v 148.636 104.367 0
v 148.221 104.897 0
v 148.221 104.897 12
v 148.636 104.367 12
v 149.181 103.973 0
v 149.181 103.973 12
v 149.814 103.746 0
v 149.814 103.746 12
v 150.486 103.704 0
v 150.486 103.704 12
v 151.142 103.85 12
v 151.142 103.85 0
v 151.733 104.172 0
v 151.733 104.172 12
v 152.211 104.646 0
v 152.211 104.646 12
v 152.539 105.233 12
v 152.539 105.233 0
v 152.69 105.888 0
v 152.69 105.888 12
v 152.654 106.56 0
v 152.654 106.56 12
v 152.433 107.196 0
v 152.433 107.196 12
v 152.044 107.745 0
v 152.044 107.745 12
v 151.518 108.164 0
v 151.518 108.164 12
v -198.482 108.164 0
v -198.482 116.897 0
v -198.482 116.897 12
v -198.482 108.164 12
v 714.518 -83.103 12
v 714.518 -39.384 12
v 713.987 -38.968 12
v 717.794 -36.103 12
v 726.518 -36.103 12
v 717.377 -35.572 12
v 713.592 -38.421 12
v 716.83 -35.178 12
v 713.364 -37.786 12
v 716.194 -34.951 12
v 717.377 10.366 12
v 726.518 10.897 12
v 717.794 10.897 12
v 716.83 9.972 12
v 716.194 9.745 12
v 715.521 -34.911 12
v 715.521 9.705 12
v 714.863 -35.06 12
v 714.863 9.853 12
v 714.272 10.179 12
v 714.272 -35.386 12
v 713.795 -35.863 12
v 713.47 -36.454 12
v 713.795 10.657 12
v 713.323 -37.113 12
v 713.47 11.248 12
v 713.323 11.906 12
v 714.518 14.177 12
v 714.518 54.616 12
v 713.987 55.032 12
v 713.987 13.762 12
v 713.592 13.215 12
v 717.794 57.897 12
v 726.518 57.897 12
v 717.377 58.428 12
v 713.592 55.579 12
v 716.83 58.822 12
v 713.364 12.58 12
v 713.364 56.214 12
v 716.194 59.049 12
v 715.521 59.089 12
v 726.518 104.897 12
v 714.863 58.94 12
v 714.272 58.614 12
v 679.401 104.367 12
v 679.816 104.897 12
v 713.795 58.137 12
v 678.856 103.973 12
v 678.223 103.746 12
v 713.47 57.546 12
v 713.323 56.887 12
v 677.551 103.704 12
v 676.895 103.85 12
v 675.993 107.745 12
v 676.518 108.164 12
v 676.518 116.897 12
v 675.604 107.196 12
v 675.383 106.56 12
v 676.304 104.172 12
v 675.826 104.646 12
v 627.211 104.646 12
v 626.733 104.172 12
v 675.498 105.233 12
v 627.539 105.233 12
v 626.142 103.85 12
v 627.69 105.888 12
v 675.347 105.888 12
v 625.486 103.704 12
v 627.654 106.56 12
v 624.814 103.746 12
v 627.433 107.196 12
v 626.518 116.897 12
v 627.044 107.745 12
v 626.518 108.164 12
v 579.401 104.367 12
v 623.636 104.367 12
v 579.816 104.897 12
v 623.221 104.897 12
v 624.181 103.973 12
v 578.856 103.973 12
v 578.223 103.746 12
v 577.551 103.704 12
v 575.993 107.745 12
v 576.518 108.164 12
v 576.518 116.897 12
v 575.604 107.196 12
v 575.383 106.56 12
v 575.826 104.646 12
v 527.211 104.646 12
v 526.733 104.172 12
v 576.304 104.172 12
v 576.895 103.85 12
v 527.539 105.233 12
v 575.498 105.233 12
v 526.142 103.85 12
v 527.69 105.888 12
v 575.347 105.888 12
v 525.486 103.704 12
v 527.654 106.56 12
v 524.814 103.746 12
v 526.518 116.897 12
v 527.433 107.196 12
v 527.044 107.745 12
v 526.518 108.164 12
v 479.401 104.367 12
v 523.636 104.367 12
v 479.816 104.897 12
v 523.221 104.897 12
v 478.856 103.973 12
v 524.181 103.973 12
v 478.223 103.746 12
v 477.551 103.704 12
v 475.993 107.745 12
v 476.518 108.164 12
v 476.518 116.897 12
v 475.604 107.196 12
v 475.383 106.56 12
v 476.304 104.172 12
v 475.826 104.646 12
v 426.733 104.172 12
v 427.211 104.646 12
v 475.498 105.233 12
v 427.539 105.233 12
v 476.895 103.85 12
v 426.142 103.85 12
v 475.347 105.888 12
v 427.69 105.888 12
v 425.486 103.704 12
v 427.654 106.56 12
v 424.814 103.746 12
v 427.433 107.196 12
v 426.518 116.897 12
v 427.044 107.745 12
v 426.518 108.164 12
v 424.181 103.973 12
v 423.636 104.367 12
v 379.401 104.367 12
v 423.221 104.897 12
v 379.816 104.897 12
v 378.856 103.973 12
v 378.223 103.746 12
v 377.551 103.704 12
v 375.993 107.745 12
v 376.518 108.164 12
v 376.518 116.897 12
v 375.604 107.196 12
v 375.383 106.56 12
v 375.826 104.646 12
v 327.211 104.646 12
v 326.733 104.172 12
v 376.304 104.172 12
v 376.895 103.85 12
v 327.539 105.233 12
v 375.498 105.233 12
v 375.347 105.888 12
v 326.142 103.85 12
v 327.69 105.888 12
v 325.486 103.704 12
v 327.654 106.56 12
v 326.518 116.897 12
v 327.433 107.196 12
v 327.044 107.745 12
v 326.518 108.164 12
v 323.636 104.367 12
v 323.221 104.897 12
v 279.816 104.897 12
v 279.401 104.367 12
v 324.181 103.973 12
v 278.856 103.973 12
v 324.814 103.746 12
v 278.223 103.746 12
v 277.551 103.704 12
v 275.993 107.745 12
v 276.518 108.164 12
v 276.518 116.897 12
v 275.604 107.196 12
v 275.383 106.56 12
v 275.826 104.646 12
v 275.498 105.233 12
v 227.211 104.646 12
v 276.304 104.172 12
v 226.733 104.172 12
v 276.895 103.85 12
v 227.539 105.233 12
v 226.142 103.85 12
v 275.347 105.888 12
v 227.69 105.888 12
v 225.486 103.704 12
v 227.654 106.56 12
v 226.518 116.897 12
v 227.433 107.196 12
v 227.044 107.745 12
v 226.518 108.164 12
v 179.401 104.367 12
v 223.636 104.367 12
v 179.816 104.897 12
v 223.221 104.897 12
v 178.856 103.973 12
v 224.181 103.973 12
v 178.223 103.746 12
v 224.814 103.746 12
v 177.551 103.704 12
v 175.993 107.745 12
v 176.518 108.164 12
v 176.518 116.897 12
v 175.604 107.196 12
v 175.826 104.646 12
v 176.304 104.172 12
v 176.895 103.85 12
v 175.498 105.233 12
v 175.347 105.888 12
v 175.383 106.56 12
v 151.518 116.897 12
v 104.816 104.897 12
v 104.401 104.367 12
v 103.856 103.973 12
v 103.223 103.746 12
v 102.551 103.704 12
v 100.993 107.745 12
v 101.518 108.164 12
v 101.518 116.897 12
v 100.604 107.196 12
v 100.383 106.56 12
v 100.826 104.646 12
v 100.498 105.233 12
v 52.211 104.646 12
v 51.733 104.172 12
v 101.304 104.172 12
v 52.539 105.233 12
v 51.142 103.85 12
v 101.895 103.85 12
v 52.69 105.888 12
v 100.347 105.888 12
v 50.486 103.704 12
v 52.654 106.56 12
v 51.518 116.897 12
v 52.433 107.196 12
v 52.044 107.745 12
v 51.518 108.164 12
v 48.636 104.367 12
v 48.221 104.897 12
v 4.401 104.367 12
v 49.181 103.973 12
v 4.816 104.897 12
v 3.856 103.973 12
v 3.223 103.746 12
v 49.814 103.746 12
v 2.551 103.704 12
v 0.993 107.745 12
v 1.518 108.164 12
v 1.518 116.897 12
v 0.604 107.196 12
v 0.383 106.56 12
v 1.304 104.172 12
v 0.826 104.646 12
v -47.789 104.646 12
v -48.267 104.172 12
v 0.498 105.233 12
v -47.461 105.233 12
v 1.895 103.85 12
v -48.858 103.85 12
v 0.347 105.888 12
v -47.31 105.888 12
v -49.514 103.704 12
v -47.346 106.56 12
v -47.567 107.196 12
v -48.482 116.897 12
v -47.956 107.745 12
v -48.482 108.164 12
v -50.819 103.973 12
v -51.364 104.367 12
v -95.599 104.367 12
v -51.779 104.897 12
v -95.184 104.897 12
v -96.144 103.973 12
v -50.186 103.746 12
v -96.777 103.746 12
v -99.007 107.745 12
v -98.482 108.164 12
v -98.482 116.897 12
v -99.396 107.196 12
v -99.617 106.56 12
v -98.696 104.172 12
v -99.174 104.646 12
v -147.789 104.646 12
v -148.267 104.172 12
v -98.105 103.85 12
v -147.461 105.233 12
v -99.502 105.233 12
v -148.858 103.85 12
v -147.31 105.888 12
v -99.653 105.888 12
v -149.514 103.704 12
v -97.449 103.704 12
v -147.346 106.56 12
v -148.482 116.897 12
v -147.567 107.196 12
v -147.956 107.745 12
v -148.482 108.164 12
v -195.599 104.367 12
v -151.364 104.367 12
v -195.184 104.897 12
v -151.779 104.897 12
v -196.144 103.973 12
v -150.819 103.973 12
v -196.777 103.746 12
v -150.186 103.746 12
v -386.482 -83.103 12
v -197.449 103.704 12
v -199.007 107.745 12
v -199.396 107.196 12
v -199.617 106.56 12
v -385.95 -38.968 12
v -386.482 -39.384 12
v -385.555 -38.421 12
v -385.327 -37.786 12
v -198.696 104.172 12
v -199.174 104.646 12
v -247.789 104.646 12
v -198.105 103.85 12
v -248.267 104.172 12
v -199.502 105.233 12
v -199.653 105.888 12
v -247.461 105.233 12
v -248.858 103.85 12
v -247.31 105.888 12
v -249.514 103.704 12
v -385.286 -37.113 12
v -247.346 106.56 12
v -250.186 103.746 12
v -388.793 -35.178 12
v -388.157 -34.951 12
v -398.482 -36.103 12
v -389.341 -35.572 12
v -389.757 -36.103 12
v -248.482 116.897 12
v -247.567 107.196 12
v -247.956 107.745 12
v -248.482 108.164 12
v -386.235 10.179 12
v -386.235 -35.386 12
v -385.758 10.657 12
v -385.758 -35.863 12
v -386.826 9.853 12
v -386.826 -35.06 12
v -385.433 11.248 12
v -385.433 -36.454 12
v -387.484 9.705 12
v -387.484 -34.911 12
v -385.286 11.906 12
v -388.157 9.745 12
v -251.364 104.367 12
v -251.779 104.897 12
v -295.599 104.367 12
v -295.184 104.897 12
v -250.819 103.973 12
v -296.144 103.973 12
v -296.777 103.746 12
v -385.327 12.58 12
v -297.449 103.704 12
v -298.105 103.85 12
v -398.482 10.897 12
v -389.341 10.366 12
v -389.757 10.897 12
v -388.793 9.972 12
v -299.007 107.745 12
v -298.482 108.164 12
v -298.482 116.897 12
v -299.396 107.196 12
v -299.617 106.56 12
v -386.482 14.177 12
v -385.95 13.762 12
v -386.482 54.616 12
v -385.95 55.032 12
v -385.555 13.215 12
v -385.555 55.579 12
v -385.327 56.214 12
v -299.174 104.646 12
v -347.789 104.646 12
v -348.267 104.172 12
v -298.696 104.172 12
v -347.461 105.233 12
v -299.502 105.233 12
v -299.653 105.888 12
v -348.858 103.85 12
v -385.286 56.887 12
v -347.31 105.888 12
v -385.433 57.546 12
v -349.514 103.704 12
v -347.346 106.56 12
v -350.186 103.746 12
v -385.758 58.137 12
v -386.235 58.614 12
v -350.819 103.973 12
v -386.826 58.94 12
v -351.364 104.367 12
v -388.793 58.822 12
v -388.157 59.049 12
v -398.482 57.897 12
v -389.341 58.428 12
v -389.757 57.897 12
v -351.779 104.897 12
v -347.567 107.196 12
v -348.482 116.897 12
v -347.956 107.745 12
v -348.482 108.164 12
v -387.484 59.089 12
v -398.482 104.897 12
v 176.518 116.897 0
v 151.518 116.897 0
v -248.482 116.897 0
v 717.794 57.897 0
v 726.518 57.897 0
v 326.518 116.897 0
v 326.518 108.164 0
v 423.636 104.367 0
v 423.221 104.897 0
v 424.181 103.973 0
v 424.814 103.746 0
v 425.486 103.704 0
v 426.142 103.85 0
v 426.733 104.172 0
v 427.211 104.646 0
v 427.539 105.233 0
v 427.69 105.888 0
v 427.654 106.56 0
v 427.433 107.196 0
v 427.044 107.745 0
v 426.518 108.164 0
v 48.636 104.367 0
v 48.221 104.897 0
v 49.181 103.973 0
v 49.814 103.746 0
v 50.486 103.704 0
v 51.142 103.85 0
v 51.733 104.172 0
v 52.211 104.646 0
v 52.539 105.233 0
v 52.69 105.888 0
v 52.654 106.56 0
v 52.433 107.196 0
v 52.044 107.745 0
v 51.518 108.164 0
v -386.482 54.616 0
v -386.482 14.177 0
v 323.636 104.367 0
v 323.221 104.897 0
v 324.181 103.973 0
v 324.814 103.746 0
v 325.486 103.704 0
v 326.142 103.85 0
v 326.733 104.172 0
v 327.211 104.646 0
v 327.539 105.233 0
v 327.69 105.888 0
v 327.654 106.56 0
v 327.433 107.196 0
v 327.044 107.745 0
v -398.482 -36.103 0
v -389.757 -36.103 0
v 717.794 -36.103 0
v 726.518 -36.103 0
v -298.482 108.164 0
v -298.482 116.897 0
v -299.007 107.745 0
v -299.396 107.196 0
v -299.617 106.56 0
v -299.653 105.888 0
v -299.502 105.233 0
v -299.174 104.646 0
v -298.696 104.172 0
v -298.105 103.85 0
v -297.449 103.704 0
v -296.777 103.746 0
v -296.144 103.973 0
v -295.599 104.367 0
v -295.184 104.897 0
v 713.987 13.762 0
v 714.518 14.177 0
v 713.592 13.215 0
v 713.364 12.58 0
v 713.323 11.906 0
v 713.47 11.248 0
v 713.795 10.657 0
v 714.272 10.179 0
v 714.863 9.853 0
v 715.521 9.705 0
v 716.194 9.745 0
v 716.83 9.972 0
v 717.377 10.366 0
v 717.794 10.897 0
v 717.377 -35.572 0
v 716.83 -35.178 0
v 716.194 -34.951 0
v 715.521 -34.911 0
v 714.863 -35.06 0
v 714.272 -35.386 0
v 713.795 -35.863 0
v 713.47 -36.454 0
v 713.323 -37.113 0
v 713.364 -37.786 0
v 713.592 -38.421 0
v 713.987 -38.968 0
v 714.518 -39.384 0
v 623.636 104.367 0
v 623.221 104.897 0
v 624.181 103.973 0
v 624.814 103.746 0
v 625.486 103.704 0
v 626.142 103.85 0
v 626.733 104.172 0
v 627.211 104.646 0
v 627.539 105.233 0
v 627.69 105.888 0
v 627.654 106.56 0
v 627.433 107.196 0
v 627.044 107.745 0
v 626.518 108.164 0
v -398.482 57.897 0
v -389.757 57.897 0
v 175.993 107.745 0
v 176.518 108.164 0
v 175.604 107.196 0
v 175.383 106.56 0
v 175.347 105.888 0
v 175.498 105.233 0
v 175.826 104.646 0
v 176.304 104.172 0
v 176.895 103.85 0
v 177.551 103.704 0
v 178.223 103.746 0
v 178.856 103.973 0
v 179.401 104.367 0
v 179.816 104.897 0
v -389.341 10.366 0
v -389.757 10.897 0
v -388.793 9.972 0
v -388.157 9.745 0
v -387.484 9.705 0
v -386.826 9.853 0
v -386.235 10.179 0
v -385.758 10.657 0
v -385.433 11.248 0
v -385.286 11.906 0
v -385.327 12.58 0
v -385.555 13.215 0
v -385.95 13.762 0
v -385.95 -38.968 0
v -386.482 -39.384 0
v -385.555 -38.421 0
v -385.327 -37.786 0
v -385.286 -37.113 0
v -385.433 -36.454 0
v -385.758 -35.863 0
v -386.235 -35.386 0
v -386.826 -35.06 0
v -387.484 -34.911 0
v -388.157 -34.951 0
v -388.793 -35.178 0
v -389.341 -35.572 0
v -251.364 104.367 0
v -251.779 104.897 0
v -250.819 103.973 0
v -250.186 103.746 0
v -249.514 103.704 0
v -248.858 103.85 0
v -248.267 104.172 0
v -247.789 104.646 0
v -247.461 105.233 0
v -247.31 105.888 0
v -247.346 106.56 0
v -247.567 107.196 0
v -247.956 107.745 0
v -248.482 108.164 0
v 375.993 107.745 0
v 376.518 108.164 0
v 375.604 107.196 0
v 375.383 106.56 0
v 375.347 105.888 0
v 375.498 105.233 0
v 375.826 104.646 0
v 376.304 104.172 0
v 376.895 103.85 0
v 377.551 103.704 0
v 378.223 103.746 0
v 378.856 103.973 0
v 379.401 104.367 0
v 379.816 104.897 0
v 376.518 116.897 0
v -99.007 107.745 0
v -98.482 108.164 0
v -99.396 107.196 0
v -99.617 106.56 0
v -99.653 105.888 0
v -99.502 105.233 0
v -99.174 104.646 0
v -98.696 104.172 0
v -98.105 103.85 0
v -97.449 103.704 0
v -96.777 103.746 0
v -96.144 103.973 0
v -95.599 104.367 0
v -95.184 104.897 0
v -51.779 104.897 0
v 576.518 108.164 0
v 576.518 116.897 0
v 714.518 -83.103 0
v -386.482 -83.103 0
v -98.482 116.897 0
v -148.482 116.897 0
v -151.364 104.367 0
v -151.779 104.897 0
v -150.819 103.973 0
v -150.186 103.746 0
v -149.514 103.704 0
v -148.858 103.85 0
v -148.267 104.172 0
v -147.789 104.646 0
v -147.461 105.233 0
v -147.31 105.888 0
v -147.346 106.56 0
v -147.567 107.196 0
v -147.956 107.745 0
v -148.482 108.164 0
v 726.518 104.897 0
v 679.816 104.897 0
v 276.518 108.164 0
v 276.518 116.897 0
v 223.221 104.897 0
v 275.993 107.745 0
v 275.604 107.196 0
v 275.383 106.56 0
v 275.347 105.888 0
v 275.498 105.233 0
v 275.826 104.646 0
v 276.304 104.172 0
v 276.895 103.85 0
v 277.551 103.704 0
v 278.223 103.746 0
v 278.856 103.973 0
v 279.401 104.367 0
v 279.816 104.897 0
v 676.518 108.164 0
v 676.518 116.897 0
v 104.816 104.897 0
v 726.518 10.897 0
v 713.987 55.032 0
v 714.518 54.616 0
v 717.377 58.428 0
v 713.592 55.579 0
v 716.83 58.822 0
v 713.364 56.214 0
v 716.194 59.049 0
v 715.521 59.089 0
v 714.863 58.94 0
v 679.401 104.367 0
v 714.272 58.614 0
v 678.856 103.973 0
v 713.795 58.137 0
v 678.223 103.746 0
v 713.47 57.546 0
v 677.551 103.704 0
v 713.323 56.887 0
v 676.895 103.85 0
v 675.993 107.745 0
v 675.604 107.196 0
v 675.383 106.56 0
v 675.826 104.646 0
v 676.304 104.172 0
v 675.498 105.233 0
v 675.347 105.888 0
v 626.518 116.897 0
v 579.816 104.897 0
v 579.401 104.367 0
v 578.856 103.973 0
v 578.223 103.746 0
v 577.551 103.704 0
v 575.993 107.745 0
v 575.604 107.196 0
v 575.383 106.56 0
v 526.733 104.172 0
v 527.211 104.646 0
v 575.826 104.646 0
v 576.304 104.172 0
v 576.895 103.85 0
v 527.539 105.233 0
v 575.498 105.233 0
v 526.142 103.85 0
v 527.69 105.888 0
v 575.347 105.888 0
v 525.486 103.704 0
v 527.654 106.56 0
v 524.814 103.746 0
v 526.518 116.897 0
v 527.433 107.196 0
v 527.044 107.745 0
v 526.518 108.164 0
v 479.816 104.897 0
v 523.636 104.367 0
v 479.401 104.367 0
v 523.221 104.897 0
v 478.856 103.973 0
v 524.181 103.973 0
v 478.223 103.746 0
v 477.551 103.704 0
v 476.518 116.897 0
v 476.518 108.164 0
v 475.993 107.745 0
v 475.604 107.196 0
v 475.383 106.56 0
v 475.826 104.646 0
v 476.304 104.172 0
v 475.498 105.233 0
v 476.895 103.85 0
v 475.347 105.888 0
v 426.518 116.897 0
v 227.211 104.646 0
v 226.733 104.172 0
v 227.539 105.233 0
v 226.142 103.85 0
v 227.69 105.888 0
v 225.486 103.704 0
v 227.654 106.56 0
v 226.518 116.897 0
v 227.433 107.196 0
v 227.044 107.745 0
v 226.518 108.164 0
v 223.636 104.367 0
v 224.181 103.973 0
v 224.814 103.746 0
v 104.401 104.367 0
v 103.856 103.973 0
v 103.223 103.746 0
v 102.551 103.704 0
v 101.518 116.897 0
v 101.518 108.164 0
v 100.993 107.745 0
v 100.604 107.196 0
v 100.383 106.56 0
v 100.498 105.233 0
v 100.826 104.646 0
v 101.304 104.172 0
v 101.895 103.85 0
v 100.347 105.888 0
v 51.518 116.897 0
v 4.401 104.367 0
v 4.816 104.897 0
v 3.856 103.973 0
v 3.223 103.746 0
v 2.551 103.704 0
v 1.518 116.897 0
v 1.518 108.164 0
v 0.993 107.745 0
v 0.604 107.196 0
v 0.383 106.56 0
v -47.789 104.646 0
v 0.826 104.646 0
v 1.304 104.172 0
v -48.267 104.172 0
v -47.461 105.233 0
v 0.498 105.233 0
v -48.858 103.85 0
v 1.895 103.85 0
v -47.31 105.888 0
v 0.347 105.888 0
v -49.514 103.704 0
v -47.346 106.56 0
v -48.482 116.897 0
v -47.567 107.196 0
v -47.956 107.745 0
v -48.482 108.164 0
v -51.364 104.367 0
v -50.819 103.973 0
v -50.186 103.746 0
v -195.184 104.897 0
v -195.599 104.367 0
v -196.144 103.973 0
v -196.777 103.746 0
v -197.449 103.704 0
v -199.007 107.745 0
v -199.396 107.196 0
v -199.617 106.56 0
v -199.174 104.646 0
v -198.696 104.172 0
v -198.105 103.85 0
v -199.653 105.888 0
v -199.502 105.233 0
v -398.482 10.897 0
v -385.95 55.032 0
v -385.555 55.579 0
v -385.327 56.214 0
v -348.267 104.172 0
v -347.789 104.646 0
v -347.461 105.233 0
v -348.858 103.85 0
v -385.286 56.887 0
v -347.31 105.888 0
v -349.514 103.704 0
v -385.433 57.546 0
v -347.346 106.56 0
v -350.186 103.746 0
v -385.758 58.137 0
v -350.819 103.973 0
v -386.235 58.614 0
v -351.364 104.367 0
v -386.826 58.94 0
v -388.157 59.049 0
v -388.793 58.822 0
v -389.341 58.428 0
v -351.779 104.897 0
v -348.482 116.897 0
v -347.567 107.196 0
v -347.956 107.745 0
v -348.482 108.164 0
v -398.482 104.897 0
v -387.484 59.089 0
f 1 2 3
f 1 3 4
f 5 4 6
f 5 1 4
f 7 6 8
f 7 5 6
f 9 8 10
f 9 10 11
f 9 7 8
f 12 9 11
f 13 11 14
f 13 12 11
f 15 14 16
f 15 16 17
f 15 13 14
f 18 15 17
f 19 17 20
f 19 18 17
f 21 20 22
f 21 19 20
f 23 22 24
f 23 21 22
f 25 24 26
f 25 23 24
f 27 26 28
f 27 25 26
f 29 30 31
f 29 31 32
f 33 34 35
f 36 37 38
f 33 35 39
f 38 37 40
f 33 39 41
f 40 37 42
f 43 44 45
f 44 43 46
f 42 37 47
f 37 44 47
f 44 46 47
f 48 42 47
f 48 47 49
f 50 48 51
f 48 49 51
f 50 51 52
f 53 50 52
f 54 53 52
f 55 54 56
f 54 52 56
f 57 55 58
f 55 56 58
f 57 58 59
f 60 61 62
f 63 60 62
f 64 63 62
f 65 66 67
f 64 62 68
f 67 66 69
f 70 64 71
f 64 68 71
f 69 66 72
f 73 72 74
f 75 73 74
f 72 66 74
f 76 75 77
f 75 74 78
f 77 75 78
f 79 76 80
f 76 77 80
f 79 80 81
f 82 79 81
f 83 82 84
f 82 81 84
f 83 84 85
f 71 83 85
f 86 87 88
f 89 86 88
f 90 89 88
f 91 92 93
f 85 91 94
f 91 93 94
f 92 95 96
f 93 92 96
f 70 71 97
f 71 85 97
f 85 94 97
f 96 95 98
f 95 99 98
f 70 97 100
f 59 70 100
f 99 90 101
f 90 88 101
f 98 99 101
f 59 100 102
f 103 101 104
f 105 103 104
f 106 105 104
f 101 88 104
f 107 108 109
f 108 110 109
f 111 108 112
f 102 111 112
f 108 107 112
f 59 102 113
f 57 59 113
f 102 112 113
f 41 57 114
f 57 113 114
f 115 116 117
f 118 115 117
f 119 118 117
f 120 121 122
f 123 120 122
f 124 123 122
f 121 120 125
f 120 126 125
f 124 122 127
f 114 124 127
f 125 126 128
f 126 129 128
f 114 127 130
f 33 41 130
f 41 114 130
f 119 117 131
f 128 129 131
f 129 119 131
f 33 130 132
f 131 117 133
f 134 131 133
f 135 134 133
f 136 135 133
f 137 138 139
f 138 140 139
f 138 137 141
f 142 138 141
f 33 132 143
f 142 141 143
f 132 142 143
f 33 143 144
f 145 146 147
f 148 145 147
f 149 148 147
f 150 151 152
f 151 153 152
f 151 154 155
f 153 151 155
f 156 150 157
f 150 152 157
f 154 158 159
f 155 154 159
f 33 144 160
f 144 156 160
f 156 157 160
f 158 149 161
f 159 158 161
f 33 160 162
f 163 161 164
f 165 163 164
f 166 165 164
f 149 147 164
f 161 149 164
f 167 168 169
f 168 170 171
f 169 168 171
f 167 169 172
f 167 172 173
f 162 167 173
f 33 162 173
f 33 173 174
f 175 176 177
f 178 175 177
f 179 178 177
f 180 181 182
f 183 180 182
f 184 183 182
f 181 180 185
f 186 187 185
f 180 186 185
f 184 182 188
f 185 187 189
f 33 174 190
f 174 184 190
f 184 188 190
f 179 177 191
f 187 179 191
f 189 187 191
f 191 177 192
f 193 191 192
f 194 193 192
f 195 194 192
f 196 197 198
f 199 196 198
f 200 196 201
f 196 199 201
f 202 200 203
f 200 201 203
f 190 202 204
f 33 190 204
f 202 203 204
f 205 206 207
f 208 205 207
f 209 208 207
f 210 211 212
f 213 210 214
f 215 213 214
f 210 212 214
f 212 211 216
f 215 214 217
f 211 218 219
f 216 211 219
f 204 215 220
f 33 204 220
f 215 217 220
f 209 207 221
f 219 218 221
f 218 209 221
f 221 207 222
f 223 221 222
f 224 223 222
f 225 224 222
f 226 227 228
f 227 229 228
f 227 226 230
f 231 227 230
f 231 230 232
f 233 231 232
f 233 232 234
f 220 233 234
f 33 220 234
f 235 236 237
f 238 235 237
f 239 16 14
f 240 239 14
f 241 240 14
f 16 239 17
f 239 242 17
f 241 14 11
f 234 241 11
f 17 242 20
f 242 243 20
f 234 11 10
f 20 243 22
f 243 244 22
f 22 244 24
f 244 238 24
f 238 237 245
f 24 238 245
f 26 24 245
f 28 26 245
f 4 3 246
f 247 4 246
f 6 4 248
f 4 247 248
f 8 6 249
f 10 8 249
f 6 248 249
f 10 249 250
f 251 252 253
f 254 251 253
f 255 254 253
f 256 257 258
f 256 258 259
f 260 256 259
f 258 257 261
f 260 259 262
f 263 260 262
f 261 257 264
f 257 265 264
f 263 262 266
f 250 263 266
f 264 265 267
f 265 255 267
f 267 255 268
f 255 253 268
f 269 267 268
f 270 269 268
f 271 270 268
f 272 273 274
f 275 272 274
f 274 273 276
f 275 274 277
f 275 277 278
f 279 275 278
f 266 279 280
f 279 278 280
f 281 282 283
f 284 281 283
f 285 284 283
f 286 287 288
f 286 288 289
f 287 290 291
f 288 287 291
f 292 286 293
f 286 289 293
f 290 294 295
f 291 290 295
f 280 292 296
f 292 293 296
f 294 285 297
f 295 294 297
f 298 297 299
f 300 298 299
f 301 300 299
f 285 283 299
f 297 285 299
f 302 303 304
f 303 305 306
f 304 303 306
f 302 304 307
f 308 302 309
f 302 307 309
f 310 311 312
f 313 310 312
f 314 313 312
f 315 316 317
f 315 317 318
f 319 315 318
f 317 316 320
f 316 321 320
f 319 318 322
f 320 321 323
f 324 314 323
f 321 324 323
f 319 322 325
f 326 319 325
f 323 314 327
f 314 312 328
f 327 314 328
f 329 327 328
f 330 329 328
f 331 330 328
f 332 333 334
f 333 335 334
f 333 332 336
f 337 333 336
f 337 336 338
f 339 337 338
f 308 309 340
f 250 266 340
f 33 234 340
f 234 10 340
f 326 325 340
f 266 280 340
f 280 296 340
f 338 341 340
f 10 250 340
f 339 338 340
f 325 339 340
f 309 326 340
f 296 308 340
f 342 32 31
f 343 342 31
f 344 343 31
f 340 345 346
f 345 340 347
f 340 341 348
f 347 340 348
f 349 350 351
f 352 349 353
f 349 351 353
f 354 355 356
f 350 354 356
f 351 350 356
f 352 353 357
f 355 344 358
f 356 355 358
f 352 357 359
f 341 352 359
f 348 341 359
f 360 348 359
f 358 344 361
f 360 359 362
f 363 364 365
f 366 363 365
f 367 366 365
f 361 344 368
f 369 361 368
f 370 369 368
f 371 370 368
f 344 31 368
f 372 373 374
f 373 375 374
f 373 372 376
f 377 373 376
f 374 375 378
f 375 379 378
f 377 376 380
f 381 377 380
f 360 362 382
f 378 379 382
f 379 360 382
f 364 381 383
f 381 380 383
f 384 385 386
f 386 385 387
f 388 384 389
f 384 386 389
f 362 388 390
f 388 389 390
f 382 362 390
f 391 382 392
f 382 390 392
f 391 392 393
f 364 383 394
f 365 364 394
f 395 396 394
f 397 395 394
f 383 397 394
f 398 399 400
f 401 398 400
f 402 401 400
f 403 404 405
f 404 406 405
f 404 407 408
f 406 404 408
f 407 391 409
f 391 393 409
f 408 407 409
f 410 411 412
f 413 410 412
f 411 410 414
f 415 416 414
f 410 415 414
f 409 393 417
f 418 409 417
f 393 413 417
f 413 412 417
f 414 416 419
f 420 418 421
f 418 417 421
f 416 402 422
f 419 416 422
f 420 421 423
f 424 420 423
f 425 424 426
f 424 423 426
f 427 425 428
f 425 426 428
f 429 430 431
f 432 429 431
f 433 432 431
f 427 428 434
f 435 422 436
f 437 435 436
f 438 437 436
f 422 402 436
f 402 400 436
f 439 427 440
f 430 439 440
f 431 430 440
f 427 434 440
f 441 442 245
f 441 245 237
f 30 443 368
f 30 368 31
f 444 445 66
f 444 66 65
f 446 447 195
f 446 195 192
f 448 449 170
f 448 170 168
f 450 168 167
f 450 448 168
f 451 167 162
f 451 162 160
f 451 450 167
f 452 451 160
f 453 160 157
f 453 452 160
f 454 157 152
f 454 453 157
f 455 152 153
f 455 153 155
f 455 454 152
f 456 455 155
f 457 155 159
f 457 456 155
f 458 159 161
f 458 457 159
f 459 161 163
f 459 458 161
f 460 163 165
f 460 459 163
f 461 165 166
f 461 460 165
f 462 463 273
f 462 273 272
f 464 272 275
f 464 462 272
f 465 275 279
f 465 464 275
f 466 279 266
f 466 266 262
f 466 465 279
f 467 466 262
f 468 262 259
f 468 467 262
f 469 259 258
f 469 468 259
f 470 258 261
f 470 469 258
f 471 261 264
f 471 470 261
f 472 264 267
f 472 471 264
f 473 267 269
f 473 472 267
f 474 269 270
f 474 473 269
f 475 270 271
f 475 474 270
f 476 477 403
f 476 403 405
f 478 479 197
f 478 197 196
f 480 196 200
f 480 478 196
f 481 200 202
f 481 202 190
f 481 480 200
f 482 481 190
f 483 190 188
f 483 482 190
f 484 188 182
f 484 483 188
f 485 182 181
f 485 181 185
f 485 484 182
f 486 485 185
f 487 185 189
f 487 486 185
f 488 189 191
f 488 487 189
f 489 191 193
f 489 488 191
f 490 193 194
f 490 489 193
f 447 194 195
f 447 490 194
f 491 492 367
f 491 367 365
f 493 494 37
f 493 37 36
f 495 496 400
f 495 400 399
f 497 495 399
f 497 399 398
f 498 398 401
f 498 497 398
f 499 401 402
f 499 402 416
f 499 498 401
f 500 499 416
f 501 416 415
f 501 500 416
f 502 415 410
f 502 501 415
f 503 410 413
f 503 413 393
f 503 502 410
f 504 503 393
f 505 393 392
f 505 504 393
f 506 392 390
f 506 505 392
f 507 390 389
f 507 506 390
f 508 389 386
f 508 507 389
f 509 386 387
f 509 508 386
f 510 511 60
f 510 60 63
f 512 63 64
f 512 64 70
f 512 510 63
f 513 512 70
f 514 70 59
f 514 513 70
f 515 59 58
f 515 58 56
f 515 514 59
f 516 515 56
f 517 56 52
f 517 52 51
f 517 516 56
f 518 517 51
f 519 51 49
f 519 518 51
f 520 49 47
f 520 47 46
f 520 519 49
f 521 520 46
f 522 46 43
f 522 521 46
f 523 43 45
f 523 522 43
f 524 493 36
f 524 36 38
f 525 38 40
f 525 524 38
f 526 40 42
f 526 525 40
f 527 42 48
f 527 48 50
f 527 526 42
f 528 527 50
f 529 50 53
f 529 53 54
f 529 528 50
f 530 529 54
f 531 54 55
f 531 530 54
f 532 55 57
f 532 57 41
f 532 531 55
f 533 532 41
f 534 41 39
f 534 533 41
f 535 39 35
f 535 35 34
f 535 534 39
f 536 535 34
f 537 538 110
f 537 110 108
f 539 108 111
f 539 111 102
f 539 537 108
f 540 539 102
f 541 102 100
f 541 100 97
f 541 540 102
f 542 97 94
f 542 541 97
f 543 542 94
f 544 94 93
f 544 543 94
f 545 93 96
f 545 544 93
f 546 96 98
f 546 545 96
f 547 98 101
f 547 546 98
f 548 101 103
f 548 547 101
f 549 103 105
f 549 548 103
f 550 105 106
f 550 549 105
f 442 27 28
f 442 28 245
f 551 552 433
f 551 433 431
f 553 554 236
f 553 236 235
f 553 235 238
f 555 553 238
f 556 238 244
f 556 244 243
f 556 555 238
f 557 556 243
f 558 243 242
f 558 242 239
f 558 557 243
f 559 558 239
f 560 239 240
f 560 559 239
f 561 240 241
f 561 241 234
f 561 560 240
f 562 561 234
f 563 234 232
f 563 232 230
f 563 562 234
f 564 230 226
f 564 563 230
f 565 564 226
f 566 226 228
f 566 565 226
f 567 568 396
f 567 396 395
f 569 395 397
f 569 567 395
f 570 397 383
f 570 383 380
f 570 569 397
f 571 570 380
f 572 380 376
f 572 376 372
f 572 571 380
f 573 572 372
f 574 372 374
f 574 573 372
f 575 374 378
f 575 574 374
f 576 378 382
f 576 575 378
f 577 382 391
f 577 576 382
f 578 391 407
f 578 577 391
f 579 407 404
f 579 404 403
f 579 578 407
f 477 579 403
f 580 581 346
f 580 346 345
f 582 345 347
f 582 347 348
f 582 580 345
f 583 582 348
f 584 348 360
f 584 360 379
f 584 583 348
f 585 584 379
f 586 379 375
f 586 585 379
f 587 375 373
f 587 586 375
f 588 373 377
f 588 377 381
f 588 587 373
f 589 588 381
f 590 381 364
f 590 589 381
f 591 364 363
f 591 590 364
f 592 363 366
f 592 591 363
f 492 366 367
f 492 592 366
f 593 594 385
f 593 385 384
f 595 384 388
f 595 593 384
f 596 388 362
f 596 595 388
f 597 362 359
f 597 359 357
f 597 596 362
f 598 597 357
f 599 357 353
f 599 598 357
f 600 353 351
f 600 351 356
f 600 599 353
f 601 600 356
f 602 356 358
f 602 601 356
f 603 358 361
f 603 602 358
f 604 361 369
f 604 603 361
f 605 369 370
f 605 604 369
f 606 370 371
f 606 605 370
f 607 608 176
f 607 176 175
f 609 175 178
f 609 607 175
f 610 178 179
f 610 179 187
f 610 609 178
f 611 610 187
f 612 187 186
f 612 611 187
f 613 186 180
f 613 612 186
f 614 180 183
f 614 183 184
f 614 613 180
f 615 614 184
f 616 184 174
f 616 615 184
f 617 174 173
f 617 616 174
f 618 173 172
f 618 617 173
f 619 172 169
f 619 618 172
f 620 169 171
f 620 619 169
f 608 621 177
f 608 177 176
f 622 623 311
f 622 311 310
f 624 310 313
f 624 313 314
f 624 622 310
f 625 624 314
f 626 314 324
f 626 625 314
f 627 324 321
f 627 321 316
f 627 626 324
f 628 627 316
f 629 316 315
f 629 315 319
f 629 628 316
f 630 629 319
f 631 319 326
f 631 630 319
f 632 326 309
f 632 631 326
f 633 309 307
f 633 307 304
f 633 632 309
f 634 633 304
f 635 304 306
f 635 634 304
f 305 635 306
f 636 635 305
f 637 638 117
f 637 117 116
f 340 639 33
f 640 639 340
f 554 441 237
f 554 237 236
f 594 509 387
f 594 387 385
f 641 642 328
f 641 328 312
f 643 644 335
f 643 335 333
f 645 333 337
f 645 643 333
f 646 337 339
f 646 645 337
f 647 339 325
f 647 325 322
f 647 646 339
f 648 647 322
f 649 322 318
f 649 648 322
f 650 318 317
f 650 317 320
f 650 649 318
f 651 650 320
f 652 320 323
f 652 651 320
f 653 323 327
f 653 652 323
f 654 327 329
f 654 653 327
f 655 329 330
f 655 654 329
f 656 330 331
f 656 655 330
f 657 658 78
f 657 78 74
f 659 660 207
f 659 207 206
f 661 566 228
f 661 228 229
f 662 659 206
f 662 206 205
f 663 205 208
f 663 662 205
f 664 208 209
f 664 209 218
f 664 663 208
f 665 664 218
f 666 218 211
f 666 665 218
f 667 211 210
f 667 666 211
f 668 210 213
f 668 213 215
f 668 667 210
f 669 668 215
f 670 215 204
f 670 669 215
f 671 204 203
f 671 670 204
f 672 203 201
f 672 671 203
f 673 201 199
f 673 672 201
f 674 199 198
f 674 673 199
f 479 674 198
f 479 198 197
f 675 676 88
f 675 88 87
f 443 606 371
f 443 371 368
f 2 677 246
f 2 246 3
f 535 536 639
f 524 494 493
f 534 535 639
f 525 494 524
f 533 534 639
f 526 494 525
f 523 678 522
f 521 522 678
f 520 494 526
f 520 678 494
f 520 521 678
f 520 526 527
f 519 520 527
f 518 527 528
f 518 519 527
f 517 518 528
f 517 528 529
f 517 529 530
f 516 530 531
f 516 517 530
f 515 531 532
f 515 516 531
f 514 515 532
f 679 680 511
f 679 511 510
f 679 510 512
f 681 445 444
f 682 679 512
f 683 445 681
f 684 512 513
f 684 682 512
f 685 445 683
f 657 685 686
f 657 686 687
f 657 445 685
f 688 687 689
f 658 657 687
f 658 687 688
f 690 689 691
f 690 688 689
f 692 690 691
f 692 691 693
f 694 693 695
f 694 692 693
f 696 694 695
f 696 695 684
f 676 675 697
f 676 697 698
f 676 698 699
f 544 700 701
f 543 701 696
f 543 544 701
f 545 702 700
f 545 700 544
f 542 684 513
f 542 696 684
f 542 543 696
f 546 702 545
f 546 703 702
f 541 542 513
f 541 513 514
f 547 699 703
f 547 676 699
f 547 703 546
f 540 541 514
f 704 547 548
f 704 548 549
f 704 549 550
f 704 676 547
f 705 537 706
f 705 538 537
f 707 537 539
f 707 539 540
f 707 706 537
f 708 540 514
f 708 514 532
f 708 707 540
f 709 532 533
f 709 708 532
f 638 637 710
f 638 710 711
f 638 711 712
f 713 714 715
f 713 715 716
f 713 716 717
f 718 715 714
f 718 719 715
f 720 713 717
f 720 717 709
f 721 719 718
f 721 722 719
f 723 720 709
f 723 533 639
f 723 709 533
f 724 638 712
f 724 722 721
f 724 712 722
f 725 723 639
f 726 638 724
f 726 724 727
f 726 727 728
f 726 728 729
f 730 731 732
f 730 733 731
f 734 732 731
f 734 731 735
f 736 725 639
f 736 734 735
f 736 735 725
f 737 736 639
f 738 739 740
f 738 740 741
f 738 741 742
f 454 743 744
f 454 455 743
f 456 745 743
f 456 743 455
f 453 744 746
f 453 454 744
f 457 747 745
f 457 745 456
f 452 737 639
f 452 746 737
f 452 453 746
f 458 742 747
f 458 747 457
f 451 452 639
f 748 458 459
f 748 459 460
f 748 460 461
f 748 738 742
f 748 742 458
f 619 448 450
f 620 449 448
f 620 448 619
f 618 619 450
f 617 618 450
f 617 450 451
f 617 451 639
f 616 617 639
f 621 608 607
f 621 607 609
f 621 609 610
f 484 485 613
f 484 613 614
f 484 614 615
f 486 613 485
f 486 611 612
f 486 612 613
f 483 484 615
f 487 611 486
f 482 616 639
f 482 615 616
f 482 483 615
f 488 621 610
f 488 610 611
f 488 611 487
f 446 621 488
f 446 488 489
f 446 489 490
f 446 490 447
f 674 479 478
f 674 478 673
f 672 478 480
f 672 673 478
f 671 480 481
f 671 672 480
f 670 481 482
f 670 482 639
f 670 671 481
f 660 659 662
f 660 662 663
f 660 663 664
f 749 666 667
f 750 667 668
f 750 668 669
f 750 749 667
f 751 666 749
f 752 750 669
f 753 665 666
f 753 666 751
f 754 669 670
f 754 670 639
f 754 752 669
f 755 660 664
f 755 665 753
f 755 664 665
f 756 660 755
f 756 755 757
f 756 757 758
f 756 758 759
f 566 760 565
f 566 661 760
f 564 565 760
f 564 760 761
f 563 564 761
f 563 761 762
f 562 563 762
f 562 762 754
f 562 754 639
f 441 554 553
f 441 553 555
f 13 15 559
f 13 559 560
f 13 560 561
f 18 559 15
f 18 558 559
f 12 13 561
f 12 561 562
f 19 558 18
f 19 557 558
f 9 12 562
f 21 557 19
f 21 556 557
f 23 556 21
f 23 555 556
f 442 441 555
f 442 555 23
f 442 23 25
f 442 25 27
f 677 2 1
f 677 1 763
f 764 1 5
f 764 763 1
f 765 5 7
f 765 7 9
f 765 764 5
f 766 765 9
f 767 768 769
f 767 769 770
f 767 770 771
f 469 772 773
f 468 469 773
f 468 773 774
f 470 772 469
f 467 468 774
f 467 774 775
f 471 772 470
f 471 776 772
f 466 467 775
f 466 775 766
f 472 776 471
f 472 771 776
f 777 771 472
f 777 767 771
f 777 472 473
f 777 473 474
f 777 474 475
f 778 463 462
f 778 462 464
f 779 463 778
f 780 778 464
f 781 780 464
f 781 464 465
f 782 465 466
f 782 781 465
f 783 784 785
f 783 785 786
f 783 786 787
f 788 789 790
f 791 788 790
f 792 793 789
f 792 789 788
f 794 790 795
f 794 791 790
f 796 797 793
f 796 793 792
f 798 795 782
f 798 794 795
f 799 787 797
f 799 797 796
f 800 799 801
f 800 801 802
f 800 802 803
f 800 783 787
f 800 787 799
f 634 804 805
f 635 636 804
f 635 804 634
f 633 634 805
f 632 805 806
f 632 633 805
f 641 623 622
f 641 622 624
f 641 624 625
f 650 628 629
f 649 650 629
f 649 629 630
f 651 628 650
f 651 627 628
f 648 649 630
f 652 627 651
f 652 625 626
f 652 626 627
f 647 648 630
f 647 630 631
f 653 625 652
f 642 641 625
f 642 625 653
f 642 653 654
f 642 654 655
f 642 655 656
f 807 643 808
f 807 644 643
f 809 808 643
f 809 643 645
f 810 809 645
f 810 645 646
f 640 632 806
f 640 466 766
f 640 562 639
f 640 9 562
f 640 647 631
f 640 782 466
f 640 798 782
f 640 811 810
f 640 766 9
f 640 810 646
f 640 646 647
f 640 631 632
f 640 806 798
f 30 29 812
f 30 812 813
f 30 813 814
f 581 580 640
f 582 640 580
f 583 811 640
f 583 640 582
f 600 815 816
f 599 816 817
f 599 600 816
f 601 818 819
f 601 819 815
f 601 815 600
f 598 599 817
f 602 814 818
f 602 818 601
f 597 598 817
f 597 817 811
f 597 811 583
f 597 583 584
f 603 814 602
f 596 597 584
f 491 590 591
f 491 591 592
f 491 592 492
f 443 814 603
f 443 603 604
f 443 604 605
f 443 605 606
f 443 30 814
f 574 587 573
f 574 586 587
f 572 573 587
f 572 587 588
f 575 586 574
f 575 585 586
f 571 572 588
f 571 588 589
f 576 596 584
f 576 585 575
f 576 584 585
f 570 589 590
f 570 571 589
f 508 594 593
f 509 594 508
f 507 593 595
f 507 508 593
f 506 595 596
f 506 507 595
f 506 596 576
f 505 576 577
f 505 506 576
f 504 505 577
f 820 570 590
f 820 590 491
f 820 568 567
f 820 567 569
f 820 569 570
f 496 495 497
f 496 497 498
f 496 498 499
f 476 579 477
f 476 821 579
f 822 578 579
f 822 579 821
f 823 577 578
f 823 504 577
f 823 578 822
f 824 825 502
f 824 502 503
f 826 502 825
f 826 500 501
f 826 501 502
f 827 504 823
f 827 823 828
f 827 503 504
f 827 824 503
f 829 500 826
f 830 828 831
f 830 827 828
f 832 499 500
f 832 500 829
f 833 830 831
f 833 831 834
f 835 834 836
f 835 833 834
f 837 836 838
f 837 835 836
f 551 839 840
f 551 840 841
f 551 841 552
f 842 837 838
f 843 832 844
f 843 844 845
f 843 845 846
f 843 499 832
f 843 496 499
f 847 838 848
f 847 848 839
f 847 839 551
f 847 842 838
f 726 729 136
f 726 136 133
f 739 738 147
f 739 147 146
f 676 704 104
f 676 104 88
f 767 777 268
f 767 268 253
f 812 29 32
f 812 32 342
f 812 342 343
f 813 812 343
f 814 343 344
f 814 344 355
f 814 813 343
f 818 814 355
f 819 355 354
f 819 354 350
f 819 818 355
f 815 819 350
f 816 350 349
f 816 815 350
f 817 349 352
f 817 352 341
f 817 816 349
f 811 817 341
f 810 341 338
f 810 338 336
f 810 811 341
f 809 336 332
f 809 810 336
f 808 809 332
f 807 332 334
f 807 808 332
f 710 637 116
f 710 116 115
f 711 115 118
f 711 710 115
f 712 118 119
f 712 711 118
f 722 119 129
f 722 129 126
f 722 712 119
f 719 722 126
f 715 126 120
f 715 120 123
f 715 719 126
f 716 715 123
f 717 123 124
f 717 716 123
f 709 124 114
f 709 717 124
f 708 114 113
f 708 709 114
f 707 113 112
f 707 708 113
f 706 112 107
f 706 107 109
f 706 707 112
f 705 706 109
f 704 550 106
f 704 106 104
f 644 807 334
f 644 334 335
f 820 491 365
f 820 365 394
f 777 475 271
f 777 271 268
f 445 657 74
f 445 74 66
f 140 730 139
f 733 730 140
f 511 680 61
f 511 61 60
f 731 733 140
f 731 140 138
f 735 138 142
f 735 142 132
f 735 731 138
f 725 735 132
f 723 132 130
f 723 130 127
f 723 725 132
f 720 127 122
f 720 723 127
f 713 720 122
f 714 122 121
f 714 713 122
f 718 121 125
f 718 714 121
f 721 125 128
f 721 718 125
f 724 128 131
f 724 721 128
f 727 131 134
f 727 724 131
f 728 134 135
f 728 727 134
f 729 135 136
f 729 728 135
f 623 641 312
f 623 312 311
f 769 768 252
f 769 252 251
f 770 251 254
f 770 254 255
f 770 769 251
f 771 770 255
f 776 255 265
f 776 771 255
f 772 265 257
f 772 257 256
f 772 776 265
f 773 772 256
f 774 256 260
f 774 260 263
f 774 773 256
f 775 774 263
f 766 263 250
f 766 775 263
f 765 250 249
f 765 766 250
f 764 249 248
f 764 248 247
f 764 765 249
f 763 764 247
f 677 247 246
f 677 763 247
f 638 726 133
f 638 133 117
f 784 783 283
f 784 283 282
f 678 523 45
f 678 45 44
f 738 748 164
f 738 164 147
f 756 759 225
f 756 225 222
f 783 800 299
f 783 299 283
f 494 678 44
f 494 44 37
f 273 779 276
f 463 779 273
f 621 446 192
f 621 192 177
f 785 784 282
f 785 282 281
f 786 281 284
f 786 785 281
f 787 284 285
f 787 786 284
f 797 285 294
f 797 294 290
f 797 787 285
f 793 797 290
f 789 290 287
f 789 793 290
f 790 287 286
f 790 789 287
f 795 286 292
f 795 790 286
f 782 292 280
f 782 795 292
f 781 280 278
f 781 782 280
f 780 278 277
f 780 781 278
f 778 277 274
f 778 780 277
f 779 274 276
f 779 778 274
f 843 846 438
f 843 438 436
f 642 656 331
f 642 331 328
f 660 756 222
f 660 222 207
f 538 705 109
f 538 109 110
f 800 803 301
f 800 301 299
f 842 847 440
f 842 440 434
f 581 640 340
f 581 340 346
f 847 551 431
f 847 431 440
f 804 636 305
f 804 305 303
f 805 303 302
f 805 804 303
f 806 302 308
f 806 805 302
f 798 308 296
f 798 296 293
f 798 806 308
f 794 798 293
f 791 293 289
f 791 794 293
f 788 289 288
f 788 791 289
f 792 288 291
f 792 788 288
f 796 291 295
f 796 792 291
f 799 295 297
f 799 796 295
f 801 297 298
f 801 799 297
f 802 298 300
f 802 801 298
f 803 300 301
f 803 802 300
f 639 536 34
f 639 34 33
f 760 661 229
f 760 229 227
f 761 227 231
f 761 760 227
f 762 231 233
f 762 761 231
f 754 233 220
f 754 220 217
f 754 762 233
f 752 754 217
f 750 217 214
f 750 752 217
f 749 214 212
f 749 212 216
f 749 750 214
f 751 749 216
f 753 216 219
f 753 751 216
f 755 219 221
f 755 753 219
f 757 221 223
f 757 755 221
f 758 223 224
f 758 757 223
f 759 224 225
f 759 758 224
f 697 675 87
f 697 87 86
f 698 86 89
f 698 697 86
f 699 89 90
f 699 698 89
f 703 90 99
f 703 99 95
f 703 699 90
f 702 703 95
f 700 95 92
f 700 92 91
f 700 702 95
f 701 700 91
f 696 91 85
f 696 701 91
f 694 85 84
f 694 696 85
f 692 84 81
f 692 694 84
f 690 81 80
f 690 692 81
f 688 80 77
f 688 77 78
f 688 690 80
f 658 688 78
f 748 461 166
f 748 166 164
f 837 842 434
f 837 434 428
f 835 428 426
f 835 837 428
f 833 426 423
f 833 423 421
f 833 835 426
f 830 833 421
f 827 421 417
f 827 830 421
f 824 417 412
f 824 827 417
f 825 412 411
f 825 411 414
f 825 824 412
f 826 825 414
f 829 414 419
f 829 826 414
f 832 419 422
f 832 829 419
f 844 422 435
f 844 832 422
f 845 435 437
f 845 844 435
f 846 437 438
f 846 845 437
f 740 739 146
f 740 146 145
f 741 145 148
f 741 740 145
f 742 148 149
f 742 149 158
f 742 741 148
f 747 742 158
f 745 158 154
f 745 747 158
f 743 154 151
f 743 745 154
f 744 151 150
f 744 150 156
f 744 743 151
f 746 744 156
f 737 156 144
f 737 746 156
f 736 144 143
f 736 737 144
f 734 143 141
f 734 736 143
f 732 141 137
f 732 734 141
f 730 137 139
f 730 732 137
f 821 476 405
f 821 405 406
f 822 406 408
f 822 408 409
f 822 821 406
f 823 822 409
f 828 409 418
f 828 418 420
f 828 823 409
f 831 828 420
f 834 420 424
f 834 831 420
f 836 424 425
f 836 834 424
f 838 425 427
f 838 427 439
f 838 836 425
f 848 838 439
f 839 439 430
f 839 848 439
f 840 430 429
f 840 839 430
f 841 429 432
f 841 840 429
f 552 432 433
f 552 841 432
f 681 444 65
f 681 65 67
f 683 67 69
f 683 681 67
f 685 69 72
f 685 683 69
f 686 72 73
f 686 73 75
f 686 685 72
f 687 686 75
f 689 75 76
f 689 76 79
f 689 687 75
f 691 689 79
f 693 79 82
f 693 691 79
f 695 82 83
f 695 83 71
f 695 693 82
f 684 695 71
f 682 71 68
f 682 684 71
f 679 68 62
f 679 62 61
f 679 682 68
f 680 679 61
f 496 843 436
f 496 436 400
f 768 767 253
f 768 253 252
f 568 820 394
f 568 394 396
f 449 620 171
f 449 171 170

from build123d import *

# Parameters (mm, degrees)
BOSS_EXTRUDE1_DEPTH = 12


with BuildPart() as part:
    # Sketch1 → Boss-Extrude1 (new body)
    with BuildSketch(Plane.XY):
        with BuildLine():
            Line((-398.481522137, 104.896883683), (-351.779111417, 104.896883683))
            ThreePointArc((-351.779111417, 104.896883683), (-348.011442278, 104.39201543), (-348.481522137, 108.164182926))
            Line((-348.481522137, 108.164182926), (-348.481522137, 116.896883683))
            Line((-348.481522137, 116.896883683), (-298.481522137, 116.896883683))
            Line((-298.481522137, 116.896883683), (-298.481522137, 108.164182926))
            ThreePointArc((-298.481522137, 108.164182926), (-298.951601996, 104.39201543), (-295.183932857, 104.896883683))
            Line((-295.183932857, 104.896883683), (-251.779111417, 104.896883683))
            ThreePointArc((-251.779111417, 104.896883683), (-248.011442278, 104.39201543), (-248.481522137, 108.164182926))
            Line((-248.481522137, 108.164182926), (-248.481522137, 116.896883683))
            Line((-248.481522137, 116.896883683), (-198.481522137, 116.896883683))
            Line((-198.481522137, 116.896883683), (-198.481522137, 108.164182926))
            ThreePointArc((-198.481522137, 108.164182926), (-198.951601996, 104.39201543), (-195.183932857, 104.896883683))
            Line((-195.183932857, 104.896883683), (-151.779111417, 104.896883683))
            ThreePointArc((-151.779111417, 104.896883683), (-148.011442278, 104.39201543), (-148.481522137, 108.164182926))
            Line((-148.481522137, 108.164182926), (-148.481522137, 116.896883683))
            Line((-148.481522137, 116.896883683), (-98.481522137, 116.896883683))
            Line((-98.481522137, 116.896883683), (-98.481522137, 108.164182926))
            ThreePointArc((-98.481522137, 108.164182926), (-98.951601996, 104.39201543), (-95.183932857, 104.896883683))
            Line((-95.183932857, 104.896883683), (-51.779111417, 104.896883683))
            ThreePointArc((-51.779111417, 104.896883683), (-48.011442278, 104.39201543), (-48.481522137, 108.164182926))
            Line((-48.481522137, 108.164182926), (-48.481522137, 116.896883683))
            Line((-48.481522137, 116.896883683), (1.518477863, 116.896883683))
            Line((1.518477863, 116.896883683), (1.518477863, 108.164182926))
            ThreePointArc((1.518477863, 108.164182926), (1.048398004, 104.39201543), (4.816067143, 104.896883683))
            Line((4.816067143, 104.896883683), (48.220888583, 104.896883683))
            ThreePointArc((48.220888583, 104.896883683), (51.988557722, 104.39201543), (51.518477863, 108.164182926))
            Line((51.518477863, 108.164182926), (51.518477863, 116.896883683))
            Line((51.518477863, 116.896883683), (101.518477863, 116.896883683))
            Line((101.518477863, 116.896883683), (101.518477863, 108.164182926))
            ThreePointArc((101.518477863, 108.164182926), (101.048398004, 104.39201543), (104.816067143, 104.896883683))
            Line((104.816067143, 104.896883683), (148.220888583, 104.896883683))
            ThreePointArc((148.220888583, 104.896883683), (151.988557722, 104.39201543), (151.518477863, 108.164182926))
            Line((151.518477863, 108.164182926), (151.518477863, 116.896883683))
            Line((151.518477863, 116.896883683), (176.518477863, 116.896883683))
            Line((176.518477863, 116.896883683), (176.518477863, 108.164182926))
            ThreePointArc((176.518477863, 108.164182926), (176.048398004, 104.39201543), (179.816067143, 104.896883683))
            Line((179.816067143, 104.896883683), (223.220888583, 104.896883683))
            ThreePointArc((223.220888583, 104.896883683), (226.988557722, 104.39201543), (226.518477863, 108.164182926))
            Line((226.518477863, 108.164182926), (226.518477863, 116.896883683))
            Line((226.518477863, 116.896883683), (276.518477863, 116.896883683))
            Line((276.518477863, 116.896883683), (276.518477863, 108.164182926))
            ThreePointArc((276.518477863, 108.164182926), (276.048398004, 104.39201543), (279.816067143, 104.896883683))
            Line((279.816067143, 104.896883683), (323.220888583, 104.896883683))
            ThreePointArc((323.220888583, 104.896883683), (326.988557722, 104.39201543), (326.518477863, 108.164182926))
            Line((326.518477863, 108.164182926), (326.518477863, 116.896883683))
            Line((326.518477863, 116.896883683), (376.518477863, 116.896883683))
            Line((376.518477863, 116.896883683), (376.518477863, 108.164182926))
            ThreePointArc((376.518477863, 108.164182926), (376.048398004, 104.39201543), (379.816067143, 104.896883683))
            Line((379.816067143, 104.896883683), (423.220888583, 104.896883683))
            ThreePointArc((423.220888583, 104.896883683), (426.988557722, 104.39201543), (426.518477863, 108.164182926))
            Line((426.518477863, 108.164182926), (426.518477863, 116.896883683))
            Line((426.518477863, 116.896883683), (476.518477863, 116.896883683))
            Line((476.518477863, 116.896883683), (476.518477863, 108.164182926))
            ThreePointArc((476.518477863, 108.164182926), (476.048398004, 104.39201543), (479.816067143, 104.896883683))
            Line((479.816067143, 104.896883683), (523.220888583, 104.896883683))
            ThreePointArc((523.220888583, 104.896883683), (526.988557722, 104.39201543), (526.518477863, 108.164182926))
            Line((526.518477863, 108.164182926), (526.518477863, 116.896883683))
            Line((526.518477863, 116.896883683), (576.518477863, 116.896883683))
            Line((576.518477863, 116.896883683), (576.518477863, 108.164182926))
            ThreePointArc((576.518477863, 108.164182926), (576.048398004, 104.39201543), (579.816067143, 104.896883683))
            Line((579.816067143, 104.896883683), (623.220888583, 104.896883683))
            ThreePointArc((623.220888583, 104.896883683), (626.988557722, 104.39201543), (626.518477863, 108.164182926))
            Line((626.518477863, 108.164182926), (626.518477863, 116.896883683))
            Line((626.518477863, 116.896883683), (676.518477863, 116.896883683))
            Line((676.518477863, 116.896883683), (676.518477863, 108.164182926))
            ThreePointArc((676.518477863, 108.164182926), (676.048398004, 104.39201543), (679.816067143, 104.896883683))
            Line((679.816067143, 104.896883683), (726.518477863, 104.896883683))
            Line((726.518477863, 104.896883683), (726.518477863, 57.896883683))
            Line((726.518477863, 57.896883683), (717.793597981, 57.896883683))
            ThreePointArc((717.793597981, 57.896883683), (714.01671802, 58.392576145), (714.518477863, 54.616497449))
            Line((714.518477863, 54.616497449), (714.518477863, 14.177269917))
            ThreePointArc((714.518477863, 14.177269917), (714.01671802, 10.401191221), (717.793597981, 10.896883683))
            Line((717.793597981, 10.896883683), (726.518477863, 10.896883683))
            Line((726.518477863, 10.896883683), (726.518477863, -36.103116317))
            Line((726.518477863, -36.103116317), (717.793597981, -36.103116317))
            ThreePointArc((717.793597981, -36.103116317), (714.01671802, -35.607423855), (714.518477863, -39.383502551))
            Line((714.518477863, -39.383502551), (714.518477863, -71.103116317))
            Line((714.518477863, -71.103116317), (714.518477863, -83.103116317))
            Line((714.518477863, -83.103116317), (-386.481522137, -83.103116317))
            Line((-386.481522137, -83.103116317), (-386.481522137, -39.383502551))
            ThreePointArc((-386.481522137, -39.383502551), (-385.979762293, -35.607423855), (-389.756642255, -36.103116317))
            Line((-389.756642255, -36.103116317), (-398.481522137, -36.103116317))
            Line((-398.481522137, -36.103116317), (-398.481522137, 10.896883683))
            Line((-398.481522137, 10.896883683), (-389.756642255, 10.896883683))
            ThreePointArc((-389.756642255, 10.896883683), (-385.979762293, 10.401191221), (-386.481522137, 14.177269917))
            Line((-386.481522137, 14.177269917), (-386.481522137, 54.616497449))
            ThreePointArc((-386.481522137, 54.616497449), (-385.979762293, 58.392576145), (-389.756642255, 57.896883683))
            Line((-389.756642255, 57.896883683), (-398.481522137, 57.896883683))
            Line((-398.481522137, 57.896883683), (-398.481522137, 104.896883683))
        make_face()
    extrude(amount=BOSS_EXTRUDE1_DEPTH)


solid = part.part
